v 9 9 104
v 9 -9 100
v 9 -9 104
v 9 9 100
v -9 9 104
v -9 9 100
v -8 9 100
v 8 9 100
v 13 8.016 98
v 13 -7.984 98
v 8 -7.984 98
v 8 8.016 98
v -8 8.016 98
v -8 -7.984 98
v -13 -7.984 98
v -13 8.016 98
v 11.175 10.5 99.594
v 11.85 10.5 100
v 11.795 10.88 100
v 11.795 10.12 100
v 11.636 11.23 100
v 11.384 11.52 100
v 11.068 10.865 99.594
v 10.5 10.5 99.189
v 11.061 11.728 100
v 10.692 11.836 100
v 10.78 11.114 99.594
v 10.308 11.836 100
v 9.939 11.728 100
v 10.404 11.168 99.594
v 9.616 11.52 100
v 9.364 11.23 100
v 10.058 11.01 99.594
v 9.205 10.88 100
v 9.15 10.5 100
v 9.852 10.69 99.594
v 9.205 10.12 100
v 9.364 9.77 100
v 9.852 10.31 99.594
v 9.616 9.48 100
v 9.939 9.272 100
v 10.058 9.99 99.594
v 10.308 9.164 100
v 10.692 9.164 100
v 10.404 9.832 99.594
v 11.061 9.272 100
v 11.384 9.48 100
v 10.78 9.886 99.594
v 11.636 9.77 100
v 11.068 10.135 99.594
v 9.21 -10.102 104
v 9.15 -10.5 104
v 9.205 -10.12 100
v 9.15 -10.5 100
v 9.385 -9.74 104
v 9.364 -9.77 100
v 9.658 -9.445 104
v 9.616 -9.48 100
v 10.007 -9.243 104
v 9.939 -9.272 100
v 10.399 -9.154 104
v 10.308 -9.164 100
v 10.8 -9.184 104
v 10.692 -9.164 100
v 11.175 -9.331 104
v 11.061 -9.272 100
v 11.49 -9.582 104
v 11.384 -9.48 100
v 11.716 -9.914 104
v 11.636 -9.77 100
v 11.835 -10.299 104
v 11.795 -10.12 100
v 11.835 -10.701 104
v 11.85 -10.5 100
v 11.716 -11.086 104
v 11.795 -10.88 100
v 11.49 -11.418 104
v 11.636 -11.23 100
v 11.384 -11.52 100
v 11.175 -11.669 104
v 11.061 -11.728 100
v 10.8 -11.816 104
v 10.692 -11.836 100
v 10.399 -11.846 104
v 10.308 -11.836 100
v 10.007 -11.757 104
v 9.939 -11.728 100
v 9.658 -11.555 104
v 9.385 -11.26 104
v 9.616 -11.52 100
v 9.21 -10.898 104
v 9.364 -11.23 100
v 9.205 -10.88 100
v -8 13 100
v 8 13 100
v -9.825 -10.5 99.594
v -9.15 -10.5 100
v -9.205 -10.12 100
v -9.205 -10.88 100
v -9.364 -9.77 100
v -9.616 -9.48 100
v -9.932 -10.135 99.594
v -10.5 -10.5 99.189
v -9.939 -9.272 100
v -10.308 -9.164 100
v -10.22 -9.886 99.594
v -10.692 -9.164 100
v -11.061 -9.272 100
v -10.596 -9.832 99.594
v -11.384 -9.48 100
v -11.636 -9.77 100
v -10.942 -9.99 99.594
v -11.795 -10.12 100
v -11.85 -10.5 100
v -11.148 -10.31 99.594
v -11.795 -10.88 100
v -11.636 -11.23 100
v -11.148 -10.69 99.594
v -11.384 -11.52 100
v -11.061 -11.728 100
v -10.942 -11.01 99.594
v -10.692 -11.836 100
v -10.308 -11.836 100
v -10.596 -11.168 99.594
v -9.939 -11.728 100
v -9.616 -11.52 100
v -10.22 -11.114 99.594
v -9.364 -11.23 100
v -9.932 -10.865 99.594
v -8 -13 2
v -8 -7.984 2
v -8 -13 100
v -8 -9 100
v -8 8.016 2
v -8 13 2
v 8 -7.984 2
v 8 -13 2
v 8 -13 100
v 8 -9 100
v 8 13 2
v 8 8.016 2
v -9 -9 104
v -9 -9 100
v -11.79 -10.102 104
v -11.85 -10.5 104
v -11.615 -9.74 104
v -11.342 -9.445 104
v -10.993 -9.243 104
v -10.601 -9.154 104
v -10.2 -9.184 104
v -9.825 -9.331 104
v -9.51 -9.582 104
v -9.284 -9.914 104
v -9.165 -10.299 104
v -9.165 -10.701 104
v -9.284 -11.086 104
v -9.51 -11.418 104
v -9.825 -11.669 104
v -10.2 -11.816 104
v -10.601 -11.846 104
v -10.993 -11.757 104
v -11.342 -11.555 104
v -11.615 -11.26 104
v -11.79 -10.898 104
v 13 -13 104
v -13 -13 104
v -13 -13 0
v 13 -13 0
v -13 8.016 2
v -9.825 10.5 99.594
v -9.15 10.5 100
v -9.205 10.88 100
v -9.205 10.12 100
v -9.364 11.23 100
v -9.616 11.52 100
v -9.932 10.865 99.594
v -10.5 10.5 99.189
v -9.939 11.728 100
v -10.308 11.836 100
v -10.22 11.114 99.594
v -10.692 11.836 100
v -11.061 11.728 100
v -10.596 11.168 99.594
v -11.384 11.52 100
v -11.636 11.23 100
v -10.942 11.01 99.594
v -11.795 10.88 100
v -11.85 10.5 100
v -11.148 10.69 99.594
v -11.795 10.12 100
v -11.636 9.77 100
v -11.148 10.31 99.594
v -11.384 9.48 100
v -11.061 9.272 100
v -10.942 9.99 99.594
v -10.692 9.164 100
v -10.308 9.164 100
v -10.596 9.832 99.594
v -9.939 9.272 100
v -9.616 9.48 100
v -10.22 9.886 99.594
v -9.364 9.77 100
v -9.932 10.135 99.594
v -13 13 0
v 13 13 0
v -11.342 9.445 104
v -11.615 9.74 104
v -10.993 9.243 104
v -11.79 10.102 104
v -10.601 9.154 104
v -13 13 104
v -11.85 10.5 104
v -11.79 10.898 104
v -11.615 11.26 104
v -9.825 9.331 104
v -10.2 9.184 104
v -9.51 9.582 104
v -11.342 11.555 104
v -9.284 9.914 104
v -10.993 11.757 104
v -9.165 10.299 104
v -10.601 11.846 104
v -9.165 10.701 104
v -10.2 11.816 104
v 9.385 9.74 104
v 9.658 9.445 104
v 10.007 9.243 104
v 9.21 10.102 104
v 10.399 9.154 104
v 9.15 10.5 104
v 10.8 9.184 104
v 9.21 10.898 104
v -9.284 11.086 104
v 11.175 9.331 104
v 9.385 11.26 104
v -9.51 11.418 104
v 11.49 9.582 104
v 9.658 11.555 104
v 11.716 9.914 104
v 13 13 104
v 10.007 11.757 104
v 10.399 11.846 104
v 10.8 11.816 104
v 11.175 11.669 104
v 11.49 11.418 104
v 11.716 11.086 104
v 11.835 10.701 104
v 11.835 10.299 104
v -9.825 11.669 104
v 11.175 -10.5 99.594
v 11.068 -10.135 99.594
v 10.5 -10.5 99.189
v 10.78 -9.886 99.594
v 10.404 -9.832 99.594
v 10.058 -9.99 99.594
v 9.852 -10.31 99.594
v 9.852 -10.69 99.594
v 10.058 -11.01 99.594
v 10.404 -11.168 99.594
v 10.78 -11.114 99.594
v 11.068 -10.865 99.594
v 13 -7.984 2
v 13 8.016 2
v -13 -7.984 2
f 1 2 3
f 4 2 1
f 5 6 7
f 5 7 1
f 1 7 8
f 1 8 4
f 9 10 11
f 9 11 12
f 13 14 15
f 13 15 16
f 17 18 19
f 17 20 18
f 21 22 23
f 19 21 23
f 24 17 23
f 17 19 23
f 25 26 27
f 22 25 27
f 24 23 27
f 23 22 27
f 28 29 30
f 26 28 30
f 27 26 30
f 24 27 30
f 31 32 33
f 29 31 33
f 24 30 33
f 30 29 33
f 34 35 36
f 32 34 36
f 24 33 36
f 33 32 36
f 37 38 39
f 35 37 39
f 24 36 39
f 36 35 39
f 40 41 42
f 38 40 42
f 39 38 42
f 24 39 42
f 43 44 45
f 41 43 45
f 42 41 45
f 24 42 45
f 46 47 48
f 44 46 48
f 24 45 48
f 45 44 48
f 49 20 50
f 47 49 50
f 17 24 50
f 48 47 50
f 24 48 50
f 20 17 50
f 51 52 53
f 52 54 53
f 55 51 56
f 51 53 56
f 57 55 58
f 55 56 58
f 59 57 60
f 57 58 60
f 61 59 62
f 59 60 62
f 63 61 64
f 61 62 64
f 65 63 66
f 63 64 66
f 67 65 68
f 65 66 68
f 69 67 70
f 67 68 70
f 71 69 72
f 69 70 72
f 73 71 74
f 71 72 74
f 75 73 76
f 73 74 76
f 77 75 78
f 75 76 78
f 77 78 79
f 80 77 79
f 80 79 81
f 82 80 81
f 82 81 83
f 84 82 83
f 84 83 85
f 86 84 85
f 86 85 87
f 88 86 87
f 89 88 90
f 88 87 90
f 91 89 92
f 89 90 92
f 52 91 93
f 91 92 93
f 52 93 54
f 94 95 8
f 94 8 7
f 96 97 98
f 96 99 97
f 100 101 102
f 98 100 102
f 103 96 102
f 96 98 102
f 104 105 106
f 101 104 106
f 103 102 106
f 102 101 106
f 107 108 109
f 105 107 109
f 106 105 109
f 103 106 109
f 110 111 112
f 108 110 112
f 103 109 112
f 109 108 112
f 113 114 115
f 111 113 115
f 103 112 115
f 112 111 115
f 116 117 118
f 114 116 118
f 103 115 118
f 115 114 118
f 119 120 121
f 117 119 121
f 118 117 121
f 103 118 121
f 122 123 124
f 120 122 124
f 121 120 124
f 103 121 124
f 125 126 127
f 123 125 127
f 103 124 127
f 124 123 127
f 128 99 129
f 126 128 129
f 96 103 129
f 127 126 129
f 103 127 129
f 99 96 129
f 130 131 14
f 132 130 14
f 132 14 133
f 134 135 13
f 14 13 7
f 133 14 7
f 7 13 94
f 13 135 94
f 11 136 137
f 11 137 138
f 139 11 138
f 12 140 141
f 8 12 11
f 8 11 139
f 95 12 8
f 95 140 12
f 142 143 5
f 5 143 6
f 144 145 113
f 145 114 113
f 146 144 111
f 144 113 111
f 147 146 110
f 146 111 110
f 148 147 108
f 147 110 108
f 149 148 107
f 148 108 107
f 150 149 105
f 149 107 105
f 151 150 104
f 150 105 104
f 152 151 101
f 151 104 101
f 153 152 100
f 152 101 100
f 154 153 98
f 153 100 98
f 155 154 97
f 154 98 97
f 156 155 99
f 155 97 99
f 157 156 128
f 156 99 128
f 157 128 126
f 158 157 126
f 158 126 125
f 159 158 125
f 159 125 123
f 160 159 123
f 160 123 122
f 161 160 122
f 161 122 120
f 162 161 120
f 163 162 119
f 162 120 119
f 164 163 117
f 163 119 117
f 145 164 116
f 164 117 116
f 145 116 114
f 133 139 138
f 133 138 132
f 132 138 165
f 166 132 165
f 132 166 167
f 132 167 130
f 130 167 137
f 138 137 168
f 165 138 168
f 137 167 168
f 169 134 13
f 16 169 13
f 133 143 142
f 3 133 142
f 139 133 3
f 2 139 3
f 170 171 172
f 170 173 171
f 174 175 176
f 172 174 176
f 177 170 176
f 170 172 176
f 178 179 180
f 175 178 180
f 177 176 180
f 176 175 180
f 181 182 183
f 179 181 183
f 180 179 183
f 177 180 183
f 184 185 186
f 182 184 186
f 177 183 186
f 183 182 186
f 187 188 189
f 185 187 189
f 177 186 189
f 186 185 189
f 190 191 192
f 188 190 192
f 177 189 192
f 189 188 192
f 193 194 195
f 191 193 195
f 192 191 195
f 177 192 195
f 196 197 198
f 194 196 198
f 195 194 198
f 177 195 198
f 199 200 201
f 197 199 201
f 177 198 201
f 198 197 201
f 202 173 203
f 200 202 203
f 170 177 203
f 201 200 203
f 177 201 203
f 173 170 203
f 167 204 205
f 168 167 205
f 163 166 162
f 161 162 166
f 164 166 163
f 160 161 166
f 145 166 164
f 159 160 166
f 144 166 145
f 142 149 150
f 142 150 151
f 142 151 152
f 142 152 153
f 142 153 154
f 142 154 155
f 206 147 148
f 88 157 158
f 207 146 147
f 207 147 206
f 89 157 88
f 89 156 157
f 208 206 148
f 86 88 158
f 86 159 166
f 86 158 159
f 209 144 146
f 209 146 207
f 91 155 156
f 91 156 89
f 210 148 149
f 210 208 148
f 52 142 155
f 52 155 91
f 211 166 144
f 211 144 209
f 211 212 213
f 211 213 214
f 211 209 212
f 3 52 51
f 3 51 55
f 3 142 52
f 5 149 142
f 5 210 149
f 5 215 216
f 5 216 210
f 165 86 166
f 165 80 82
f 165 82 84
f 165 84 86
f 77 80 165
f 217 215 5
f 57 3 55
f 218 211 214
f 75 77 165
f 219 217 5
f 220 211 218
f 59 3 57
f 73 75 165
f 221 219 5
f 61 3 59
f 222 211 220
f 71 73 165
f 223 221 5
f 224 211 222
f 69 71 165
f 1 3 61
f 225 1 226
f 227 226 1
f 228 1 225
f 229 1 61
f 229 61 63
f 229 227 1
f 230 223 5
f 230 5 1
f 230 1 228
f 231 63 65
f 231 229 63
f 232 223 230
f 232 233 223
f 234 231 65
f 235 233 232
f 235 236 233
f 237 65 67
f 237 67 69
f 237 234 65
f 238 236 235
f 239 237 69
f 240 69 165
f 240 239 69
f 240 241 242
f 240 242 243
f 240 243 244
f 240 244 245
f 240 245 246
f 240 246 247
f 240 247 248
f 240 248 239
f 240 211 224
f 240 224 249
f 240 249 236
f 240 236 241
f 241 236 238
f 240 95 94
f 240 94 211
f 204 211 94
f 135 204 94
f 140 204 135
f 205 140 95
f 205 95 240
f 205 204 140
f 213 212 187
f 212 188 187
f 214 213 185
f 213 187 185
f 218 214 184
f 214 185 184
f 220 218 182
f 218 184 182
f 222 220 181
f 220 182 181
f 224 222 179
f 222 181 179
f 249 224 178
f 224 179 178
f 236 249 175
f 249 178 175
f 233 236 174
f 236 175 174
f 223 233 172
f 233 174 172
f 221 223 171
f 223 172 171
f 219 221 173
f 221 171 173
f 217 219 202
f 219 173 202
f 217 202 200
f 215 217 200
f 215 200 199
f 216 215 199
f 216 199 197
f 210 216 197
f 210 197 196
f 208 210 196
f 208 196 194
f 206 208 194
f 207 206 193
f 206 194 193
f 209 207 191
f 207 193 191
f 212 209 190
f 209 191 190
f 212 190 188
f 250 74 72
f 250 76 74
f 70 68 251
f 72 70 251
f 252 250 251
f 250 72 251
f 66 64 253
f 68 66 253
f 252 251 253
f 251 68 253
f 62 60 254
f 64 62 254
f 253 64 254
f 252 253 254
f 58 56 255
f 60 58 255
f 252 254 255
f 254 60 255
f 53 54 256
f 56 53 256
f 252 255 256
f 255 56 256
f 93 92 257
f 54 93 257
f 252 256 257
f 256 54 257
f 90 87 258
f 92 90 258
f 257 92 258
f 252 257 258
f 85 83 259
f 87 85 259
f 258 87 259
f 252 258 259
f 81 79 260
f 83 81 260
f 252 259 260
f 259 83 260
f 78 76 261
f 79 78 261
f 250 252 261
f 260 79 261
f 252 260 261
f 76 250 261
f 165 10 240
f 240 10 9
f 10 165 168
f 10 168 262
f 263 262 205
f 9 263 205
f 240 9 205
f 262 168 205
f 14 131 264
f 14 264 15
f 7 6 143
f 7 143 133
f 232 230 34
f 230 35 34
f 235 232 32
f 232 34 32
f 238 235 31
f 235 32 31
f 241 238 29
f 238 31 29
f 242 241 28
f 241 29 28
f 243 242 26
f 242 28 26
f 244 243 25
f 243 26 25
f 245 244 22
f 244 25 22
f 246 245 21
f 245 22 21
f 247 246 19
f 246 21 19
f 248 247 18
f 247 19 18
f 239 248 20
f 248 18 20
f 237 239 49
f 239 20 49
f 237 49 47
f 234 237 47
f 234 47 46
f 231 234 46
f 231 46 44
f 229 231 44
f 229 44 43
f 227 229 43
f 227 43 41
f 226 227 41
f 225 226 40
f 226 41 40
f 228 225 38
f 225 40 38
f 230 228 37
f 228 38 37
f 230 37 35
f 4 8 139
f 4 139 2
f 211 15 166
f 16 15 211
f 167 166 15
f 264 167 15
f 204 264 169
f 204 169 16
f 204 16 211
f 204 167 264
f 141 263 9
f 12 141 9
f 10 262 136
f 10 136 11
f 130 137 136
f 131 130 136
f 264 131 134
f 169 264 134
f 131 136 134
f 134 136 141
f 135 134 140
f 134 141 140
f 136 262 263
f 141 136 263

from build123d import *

# Parameters (mm, degrees)
F0_W      = 26
F0_H      = 26
F0_W_2    = 16
F0_H_2    = 16
F1_DEPTH  = 2
F2_DEPTH  = 100
F3_W      = 26
F3_H      = 26
F3_W_2    = 18
F3_H_2    = 18
F4_DEPTH  = 4
F6_D      = 2.7
F6_DEPTH  = 4
F6_TIP    = 0.8111618357
F7_W      = 16
F7_H      = 96
F8_DEPTH  = 26.001
F9_W      = 16
F9_H      = 98
F10_DEPTH = 26.001


with BuildPart() as f1:
    # F0 (on Top) → F1 (new body)
    with BuildSketch(Plane.XY):
        Rectangle(F0_W, F0_H)
        Rectangle(F0_W_2, F0_H_2, mode=Mode.SUBTRACT)
        Rectangle(F0_W_2, F0_H_2)
    extrude(amount=F1_DEPTH)

    # F0 (on Top) → F2 (join)
    with BuildSketch(Plane.XY):
        Rectangle(F0_W, F0_H)
        Rectangle(F0_W_2, F0_H_2, mode=Mode.SUBTRACT)
    extrude(amount=F2_DEPTH)

    # F3 (on face) → F4 (join)
    with BuildSketch(Plane.XY.offset(100)):
        Rectangle(F3_W, F3_H)
        Rectangle(F3_W_2, F3_H_2, mode=Mode.SUBTRACT)
    extrude(amount=F4_DEPTH)

    # F6
    with Locations(Plane.XY.offset(104)):
        with Locations((-10.5, 10.5), (10.5, 10.5), (-10.5, -10.5), (10.5, -10.5)):
            Hole(F6_D / 2, depth=F6_DEPTH)
            with Locations((0, 0, -(F6_DEPTH + F6_TIP / 2))):  # 118° drill point
                Cone(0, F6_D / 2, F6_TIP, mode=Mode.SUBTRACT)

    # F7 (on face) → F8 (cut, through all)
    with BuildSketch(Plane.YZ.offset(13)):
        with Locations((0.015812546, 50)):
            Rectangle(F7_W, F7_H)
    extrude(amount=-F8_DEPTH, mode=Mode.SUBTRACT)

    # F9 (on face) → F10 (cut, through all)
    with BuildSketch(Plane(origin=(0, 13, 0), x_dir=(-1, 0, 0), z_dir=(0, 1, 0))):
        with Locations((0, 51)):
            Rectangle(F9_W, F9_H)
    extrude(amount=-F10_DEPTH, mode=Mode.SUBTRACT)


solid = f1.part
